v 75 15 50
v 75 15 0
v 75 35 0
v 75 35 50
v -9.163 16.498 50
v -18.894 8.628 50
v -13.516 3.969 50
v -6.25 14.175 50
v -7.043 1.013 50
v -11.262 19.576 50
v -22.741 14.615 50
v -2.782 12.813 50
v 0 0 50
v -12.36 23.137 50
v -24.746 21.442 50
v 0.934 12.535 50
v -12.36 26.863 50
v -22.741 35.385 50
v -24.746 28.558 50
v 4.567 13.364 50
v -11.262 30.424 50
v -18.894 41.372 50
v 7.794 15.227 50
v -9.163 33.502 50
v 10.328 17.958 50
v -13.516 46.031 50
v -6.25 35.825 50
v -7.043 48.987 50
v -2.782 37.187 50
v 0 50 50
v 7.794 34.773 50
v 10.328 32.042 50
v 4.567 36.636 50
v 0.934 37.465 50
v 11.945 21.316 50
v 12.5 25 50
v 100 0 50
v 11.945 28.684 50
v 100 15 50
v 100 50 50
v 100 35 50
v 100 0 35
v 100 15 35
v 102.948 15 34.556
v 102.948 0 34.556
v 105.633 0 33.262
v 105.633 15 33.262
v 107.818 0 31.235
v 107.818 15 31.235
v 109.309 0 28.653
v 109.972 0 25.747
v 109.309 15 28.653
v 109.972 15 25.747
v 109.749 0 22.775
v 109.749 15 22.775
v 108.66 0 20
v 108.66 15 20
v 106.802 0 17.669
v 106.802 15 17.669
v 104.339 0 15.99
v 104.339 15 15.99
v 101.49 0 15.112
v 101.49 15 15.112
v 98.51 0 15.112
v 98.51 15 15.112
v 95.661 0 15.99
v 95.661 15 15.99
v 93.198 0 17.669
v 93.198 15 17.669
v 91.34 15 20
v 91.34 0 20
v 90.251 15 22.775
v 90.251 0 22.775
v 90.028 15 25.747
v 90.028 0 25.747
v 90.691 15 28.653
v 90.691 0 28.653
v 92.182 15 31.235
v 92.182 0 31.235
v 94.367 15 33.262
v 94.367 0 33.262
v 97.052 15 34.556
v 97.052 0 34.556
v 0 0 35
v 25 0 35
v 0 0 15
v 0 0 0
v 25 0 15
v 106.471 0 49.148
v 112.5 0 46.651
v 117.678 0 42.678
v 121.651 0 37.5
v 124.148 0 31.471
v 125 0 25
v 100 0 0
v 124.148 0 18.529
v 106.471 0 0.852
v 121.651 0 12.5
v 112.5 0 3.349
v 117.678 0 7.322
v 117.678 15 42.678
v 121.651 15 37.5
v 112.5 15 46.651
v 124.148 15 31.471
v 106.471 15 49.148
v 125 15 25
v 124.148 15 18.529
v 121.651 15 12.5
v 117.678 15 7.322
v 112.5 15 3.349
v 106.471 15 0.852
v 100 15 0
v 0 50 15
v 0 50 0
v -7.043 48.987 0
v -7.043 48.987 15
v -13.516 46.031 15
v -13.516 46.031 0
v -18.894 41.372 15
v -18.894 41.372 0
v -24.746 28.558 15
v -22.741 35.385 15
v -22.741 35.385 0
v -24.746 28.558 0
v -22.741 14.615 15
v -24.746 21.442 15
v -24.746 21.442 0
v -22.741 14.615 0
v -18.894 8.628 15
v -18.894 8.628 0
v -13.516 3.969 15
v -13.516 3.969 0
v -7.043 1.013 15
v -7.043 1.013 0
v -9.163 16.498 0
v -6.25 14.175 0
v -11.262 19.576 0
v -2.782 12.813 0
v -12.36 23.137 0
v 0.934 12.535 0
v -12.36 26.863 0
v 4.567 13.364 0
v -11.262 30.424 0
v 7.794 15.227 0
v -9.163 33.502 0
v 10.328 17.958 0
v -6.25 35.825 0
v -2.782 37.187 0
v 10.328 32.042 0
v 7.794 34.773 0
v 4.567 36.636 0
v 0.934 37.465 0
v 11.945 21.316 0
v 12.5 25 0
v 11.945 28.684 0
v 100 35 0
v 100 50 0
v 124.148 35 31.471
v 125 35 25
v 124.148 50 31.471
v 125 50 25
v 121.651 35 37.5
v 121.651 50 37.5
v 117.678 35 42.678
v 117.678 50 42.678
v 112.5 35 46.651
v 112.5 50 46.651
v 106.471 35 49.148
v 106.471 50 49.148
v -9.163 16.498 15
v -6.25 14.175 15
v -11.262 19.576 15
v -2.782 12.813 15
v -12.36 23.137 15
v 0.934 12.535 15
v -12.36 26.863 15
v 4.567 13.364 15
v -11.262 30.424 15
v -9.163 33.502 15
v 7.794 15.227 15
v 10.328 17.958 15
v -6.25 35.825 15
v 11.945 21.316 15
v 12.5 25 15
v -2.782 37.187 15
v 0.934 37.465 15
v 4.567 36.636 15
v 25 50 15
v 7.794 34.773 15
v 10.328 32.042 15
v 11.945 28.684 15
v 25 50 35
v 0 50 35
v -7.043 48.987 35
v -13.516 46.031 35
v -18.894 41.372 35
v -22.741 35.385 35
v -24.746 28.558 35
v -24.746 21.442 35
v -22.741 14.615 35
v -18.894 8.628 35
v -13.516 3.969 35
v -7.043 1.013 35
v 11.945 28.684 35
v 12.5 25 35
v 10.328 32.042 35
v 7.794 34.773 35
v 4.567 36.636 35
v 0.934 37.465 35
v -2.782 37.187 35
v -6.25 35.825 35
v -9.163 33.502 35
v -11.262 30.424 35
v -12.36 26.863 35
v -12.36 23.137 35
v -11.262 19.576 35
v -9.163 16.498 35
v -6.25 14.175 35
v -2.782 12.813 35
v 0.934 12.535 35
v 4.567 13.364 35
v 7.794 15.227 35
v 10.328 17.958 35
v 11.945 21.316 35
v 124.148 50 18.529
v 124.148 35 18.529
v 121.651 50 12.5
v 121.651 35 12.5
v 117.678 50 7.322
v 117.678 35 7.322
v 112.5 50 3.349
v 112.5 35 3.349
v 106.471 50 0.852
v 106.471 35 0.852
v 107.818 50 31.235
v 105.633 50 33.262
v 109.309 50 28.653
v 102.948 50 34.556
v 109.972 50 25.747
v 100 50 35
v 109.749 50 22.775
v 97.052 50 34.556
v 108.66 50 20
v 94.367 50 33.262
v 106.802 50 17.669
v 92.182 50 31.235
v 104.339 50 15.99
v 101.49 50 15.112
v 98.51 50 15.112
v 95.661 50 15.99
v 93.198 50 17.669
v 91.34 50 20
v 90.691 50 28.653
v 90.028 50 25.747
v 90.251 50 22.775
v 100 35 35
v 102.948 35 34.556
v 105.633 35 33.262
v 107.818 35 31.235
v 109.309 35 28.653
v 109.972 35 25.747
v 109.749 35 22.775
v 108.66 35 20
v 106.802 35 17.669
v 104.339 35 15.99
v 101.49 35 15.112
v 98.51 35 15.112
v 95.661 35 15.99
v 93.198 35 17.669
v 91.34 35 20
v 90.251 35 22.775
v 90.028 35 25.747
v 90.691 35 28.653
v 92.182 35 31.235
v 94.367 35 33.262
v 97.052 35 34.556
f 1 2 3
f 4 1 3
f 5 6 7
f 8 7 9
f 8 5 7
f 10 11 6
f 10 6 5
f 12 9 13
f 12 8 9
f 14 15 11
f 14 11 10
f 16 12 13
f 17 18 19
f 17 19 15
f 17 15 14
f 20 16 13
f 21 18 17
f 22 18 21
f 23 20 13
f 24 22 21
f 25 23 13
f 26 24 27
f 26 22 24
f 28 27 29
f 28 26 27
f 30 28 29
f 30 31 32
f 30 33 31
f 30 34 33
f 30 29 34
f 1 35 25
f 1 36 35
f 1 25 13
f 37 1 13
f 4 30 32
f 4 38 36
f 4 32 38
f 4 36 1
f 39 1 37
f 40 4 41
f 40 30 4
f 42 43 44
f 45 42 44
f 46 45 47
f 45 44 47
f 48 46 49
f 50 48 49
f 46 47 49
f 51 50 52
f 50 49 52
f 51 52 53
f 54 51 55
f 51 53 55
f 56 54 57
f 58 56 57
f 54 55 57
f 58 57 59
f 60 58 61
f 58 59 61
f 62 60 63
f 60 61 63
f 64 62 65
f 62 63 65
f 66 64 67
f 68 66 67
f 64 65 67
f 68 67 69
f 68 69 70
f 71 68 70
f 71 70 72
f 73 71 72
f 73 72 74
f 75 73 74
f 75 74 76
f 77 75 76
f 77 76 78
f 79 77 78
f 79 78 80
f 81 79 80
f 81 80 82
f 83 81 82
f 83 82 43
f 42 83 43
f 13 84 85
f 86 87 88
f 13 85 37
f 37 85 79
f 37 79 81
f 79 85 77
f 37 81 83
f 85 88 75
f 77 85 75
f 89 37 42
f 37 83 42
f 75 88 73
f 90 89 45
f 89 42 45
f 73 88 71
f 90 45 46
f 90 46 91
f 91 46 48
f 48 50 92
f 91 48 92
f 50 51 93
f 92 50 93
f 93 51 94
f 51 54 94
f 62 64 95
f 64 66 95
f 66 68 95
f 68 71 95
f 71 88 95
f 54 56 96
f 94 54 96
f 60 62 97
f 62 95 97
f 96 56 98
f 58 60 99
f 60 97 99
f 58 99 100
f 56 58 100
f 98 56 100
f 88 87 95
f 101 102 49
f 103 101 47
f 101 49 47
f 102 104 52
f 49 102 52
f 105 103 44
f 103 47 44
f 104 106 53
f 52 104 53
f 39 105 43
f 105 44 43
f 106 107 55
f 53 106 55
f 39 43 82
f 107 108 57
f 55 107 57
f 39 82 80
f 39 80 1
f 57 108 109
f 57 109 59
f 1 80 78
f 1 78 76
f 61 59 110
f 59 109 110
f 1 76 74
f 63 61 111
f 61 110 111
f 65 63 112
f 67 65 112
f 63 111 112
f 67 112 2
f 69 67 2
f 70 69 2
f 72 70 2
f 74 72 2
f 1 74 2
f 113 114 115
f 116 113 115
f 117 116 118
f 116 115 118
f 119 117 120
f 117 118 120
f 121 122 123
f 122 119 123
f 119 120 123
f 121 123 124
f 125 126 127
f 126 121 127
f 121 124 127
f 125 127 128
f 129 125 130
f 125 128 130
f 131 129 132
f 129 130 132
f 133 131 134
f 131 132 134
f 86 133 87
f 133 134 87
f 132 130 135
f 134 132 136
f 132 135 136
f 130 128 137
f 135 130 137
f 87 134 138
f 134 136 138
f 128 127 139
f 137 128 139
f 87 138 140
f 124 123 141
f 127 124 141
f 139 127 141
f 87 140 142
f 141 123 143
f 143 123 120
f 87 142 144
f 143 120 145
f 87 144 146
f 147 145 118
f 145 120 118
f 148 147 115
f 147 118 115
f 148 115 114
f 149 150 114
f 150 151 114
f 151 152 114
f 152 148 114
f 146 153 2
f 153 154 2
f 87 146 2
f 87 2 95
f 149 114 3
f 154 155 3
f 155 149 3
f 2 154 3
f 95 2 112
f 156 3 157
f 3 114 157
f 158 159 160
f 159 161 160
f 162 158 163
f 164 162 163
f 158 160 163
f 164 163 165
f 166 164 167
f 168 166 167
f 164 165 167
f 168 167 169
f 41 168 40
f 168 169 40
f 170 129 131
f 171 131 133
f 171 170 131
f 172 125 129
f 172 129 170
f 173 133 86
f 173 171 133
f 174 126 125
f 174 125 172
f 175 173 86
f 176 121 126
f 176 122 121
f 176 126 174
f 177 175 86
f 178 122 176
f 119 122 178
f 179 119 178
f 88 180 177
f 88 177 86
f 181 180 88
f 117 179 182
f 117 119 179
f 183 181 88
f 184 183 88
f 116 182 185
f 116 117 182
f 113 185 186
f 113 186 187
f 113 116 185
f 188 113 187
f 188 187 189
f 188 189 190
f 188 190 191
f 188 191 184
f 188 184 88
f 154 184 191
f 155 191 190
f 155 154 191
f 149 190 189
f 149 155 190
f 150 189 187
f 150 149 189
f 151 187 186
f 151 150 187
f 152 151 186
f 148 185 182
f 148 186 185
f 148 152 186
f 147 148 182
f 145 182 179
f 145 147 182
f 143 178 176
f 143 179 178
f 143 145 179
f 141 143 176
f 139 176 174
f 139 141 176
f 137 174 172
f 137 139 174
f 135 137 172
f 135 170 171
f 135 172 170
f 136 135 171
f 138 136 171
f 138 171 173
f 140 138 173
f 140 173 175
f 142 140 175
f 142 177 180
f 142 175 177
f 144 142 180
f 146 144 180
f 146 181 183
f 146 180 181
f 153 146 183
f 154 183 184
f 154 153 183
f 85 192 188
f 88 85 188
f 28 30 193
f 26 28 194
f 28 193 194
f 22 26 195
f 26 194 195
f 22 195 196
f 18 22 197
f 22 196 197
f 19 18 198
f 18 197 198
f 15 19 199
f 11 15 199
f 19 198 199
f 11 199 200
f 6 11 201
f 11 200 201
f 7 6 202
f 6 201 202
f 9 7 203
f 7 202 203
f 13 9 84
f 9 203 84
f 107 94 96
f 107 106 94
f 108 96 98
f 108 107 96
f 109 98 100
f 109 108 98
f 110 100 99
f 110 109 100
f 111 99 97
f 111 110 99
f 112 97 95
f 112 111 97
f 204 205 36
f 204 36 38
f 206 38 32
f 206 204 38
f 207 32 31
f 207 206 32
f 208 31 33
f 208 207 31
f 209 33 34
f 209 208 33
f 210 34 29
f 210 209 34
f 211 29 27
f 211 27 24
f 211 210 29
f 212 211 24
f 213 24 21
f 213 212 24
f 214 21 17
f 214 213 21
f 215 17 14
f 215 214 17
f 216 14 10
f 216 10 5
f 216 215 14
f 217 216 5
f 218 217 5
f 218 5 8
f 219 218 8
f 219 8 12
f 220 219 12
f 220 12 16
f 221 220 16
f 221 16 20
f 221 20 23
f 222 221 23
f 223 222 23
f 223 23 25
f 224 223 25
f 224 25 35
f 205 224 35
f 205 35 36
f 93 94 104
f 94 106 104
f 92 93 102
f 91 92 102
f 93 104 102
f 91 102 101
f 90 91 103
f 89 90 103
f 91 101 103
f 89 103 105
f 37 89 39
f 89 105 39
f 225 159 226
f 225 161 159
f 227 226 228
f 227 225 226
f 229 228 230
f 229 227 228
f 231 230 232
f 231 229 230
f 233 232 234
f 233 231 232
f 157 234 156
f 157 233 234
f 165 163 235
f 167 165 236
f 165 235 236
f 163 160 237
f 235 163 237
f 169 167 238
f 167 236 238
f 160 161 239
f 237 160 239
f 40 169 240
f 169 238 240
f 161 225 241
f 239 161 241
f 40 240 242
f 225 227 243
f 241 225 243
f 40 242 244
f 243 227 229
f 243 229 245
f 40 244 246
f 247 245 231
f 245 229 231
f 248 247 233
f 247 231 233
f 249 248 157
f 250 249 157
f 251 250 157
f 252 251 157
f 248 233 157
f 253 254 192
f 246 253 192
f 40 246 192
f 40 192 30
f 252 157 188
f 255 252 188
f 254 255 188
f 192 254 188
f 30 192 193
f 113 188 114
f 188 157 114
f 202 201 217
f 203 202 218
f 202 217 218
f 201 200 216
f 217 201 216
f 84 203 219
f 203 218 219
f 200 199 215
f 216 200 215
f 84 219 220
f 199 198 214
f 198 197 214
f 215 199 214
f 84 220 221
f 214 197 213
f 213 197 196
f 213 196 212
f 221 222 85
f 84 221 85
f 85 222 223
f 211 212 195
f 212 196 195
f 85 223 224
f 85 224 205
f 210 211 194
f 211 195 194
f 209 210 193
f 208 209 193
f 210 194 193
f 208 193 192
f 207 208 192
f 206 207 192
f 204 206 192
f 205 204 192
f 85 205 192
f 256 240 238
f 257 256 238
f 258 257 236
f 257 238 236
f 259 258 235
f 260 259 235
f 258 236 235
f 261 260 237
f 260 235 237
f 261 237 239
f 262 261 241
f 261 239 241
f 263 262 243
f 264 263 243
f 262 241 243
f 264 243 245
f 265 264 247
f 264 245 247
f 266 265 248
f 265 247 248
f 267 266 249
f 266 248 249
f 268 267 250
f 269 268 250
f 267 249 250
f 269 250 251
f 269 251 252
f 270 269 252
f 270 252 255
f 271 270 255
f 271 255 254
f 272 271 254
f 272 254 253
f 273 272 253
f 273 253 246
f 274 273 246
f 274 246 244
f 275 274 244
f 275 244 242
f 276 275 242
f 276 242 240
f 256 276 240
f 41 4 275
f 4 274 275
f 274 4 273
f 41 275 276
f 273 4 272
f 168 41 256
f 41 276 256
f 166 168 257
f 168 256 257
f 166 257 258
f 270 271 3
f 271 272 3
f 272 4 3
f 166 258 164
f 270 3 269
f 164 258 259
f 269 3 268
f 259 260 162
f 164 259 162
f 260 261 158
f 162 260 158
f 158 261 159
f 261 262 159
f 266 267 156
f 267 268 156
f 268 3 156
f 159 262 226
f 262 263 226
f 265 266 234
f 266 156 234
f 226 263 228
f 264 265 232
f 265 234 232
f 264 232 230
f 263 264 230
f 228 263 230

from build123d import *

# Parameters (mm, degrees)
SKETCH1_R           = 12.5
BOSS_EXTRUDE1_DEPTH = 50
FILLET1_R           = 25
SKETCH2_R           = 10
SKETCH2_W           = 50
SKETCH2_H           = 20
CUT_EXTRUDE1_DEPTH  = 55


with BuildPart() as part:
    # Sketch1 → Boss-Extrude1 (new body)
    with BuildSketch(Plane.XY):
        with BuildLine():
            ThreePointArc((0, 50), (-25, 25), (0, 0))
            Line((0, 0), (125, 0))
            Line((125, 0), (125, 15))
            Line((125, 15), (75, 15))
            Line((75, 15), (75, 35))
            Line((75, 35), (125, 35))
            Line((125, 35), (125, 50))
            Line((125, 50), (0, 50))
        make_face()
        with Locations((0, 25)):
            Circle(SKETCH1_R, mode=Mode.SUBTRACT)
    extrude(amount=BOSS_EXTRUDE1_DEPTH)

    # Fillet1
    fillet1_edges = [part.edges().sort_by_distance(p)[0] for p in [
        (125, 7.5, 0),
        (125, 42.5, 0),
        (125, 7.5, 50),
        (125, 42.5, 50),
    ]]
    fillet(fillet1_edges, radius=FILLET1_R - 0.0001)  # a hair under: the kernel refuses the full size

    # Sketch2 → Cut-Extrude1 (cut)
    with BuildSketch(Plane(origin=(0, 50, 0), x_dir=(1, 0, 0), z_dir=(0, 1, 0))):
        with Locations(Location((100, -25, 0), (0, 0, 270))):
            Circle(SKETCH2_R)
        with Locations((0, -25)):
            Rectangle(SKETCH2_W, SKETCH2_H)
    extrude(amount=-CUT_EXTRUDE1_DEPTH, mode=Mode.SUBTRACT)


solid = part.part
